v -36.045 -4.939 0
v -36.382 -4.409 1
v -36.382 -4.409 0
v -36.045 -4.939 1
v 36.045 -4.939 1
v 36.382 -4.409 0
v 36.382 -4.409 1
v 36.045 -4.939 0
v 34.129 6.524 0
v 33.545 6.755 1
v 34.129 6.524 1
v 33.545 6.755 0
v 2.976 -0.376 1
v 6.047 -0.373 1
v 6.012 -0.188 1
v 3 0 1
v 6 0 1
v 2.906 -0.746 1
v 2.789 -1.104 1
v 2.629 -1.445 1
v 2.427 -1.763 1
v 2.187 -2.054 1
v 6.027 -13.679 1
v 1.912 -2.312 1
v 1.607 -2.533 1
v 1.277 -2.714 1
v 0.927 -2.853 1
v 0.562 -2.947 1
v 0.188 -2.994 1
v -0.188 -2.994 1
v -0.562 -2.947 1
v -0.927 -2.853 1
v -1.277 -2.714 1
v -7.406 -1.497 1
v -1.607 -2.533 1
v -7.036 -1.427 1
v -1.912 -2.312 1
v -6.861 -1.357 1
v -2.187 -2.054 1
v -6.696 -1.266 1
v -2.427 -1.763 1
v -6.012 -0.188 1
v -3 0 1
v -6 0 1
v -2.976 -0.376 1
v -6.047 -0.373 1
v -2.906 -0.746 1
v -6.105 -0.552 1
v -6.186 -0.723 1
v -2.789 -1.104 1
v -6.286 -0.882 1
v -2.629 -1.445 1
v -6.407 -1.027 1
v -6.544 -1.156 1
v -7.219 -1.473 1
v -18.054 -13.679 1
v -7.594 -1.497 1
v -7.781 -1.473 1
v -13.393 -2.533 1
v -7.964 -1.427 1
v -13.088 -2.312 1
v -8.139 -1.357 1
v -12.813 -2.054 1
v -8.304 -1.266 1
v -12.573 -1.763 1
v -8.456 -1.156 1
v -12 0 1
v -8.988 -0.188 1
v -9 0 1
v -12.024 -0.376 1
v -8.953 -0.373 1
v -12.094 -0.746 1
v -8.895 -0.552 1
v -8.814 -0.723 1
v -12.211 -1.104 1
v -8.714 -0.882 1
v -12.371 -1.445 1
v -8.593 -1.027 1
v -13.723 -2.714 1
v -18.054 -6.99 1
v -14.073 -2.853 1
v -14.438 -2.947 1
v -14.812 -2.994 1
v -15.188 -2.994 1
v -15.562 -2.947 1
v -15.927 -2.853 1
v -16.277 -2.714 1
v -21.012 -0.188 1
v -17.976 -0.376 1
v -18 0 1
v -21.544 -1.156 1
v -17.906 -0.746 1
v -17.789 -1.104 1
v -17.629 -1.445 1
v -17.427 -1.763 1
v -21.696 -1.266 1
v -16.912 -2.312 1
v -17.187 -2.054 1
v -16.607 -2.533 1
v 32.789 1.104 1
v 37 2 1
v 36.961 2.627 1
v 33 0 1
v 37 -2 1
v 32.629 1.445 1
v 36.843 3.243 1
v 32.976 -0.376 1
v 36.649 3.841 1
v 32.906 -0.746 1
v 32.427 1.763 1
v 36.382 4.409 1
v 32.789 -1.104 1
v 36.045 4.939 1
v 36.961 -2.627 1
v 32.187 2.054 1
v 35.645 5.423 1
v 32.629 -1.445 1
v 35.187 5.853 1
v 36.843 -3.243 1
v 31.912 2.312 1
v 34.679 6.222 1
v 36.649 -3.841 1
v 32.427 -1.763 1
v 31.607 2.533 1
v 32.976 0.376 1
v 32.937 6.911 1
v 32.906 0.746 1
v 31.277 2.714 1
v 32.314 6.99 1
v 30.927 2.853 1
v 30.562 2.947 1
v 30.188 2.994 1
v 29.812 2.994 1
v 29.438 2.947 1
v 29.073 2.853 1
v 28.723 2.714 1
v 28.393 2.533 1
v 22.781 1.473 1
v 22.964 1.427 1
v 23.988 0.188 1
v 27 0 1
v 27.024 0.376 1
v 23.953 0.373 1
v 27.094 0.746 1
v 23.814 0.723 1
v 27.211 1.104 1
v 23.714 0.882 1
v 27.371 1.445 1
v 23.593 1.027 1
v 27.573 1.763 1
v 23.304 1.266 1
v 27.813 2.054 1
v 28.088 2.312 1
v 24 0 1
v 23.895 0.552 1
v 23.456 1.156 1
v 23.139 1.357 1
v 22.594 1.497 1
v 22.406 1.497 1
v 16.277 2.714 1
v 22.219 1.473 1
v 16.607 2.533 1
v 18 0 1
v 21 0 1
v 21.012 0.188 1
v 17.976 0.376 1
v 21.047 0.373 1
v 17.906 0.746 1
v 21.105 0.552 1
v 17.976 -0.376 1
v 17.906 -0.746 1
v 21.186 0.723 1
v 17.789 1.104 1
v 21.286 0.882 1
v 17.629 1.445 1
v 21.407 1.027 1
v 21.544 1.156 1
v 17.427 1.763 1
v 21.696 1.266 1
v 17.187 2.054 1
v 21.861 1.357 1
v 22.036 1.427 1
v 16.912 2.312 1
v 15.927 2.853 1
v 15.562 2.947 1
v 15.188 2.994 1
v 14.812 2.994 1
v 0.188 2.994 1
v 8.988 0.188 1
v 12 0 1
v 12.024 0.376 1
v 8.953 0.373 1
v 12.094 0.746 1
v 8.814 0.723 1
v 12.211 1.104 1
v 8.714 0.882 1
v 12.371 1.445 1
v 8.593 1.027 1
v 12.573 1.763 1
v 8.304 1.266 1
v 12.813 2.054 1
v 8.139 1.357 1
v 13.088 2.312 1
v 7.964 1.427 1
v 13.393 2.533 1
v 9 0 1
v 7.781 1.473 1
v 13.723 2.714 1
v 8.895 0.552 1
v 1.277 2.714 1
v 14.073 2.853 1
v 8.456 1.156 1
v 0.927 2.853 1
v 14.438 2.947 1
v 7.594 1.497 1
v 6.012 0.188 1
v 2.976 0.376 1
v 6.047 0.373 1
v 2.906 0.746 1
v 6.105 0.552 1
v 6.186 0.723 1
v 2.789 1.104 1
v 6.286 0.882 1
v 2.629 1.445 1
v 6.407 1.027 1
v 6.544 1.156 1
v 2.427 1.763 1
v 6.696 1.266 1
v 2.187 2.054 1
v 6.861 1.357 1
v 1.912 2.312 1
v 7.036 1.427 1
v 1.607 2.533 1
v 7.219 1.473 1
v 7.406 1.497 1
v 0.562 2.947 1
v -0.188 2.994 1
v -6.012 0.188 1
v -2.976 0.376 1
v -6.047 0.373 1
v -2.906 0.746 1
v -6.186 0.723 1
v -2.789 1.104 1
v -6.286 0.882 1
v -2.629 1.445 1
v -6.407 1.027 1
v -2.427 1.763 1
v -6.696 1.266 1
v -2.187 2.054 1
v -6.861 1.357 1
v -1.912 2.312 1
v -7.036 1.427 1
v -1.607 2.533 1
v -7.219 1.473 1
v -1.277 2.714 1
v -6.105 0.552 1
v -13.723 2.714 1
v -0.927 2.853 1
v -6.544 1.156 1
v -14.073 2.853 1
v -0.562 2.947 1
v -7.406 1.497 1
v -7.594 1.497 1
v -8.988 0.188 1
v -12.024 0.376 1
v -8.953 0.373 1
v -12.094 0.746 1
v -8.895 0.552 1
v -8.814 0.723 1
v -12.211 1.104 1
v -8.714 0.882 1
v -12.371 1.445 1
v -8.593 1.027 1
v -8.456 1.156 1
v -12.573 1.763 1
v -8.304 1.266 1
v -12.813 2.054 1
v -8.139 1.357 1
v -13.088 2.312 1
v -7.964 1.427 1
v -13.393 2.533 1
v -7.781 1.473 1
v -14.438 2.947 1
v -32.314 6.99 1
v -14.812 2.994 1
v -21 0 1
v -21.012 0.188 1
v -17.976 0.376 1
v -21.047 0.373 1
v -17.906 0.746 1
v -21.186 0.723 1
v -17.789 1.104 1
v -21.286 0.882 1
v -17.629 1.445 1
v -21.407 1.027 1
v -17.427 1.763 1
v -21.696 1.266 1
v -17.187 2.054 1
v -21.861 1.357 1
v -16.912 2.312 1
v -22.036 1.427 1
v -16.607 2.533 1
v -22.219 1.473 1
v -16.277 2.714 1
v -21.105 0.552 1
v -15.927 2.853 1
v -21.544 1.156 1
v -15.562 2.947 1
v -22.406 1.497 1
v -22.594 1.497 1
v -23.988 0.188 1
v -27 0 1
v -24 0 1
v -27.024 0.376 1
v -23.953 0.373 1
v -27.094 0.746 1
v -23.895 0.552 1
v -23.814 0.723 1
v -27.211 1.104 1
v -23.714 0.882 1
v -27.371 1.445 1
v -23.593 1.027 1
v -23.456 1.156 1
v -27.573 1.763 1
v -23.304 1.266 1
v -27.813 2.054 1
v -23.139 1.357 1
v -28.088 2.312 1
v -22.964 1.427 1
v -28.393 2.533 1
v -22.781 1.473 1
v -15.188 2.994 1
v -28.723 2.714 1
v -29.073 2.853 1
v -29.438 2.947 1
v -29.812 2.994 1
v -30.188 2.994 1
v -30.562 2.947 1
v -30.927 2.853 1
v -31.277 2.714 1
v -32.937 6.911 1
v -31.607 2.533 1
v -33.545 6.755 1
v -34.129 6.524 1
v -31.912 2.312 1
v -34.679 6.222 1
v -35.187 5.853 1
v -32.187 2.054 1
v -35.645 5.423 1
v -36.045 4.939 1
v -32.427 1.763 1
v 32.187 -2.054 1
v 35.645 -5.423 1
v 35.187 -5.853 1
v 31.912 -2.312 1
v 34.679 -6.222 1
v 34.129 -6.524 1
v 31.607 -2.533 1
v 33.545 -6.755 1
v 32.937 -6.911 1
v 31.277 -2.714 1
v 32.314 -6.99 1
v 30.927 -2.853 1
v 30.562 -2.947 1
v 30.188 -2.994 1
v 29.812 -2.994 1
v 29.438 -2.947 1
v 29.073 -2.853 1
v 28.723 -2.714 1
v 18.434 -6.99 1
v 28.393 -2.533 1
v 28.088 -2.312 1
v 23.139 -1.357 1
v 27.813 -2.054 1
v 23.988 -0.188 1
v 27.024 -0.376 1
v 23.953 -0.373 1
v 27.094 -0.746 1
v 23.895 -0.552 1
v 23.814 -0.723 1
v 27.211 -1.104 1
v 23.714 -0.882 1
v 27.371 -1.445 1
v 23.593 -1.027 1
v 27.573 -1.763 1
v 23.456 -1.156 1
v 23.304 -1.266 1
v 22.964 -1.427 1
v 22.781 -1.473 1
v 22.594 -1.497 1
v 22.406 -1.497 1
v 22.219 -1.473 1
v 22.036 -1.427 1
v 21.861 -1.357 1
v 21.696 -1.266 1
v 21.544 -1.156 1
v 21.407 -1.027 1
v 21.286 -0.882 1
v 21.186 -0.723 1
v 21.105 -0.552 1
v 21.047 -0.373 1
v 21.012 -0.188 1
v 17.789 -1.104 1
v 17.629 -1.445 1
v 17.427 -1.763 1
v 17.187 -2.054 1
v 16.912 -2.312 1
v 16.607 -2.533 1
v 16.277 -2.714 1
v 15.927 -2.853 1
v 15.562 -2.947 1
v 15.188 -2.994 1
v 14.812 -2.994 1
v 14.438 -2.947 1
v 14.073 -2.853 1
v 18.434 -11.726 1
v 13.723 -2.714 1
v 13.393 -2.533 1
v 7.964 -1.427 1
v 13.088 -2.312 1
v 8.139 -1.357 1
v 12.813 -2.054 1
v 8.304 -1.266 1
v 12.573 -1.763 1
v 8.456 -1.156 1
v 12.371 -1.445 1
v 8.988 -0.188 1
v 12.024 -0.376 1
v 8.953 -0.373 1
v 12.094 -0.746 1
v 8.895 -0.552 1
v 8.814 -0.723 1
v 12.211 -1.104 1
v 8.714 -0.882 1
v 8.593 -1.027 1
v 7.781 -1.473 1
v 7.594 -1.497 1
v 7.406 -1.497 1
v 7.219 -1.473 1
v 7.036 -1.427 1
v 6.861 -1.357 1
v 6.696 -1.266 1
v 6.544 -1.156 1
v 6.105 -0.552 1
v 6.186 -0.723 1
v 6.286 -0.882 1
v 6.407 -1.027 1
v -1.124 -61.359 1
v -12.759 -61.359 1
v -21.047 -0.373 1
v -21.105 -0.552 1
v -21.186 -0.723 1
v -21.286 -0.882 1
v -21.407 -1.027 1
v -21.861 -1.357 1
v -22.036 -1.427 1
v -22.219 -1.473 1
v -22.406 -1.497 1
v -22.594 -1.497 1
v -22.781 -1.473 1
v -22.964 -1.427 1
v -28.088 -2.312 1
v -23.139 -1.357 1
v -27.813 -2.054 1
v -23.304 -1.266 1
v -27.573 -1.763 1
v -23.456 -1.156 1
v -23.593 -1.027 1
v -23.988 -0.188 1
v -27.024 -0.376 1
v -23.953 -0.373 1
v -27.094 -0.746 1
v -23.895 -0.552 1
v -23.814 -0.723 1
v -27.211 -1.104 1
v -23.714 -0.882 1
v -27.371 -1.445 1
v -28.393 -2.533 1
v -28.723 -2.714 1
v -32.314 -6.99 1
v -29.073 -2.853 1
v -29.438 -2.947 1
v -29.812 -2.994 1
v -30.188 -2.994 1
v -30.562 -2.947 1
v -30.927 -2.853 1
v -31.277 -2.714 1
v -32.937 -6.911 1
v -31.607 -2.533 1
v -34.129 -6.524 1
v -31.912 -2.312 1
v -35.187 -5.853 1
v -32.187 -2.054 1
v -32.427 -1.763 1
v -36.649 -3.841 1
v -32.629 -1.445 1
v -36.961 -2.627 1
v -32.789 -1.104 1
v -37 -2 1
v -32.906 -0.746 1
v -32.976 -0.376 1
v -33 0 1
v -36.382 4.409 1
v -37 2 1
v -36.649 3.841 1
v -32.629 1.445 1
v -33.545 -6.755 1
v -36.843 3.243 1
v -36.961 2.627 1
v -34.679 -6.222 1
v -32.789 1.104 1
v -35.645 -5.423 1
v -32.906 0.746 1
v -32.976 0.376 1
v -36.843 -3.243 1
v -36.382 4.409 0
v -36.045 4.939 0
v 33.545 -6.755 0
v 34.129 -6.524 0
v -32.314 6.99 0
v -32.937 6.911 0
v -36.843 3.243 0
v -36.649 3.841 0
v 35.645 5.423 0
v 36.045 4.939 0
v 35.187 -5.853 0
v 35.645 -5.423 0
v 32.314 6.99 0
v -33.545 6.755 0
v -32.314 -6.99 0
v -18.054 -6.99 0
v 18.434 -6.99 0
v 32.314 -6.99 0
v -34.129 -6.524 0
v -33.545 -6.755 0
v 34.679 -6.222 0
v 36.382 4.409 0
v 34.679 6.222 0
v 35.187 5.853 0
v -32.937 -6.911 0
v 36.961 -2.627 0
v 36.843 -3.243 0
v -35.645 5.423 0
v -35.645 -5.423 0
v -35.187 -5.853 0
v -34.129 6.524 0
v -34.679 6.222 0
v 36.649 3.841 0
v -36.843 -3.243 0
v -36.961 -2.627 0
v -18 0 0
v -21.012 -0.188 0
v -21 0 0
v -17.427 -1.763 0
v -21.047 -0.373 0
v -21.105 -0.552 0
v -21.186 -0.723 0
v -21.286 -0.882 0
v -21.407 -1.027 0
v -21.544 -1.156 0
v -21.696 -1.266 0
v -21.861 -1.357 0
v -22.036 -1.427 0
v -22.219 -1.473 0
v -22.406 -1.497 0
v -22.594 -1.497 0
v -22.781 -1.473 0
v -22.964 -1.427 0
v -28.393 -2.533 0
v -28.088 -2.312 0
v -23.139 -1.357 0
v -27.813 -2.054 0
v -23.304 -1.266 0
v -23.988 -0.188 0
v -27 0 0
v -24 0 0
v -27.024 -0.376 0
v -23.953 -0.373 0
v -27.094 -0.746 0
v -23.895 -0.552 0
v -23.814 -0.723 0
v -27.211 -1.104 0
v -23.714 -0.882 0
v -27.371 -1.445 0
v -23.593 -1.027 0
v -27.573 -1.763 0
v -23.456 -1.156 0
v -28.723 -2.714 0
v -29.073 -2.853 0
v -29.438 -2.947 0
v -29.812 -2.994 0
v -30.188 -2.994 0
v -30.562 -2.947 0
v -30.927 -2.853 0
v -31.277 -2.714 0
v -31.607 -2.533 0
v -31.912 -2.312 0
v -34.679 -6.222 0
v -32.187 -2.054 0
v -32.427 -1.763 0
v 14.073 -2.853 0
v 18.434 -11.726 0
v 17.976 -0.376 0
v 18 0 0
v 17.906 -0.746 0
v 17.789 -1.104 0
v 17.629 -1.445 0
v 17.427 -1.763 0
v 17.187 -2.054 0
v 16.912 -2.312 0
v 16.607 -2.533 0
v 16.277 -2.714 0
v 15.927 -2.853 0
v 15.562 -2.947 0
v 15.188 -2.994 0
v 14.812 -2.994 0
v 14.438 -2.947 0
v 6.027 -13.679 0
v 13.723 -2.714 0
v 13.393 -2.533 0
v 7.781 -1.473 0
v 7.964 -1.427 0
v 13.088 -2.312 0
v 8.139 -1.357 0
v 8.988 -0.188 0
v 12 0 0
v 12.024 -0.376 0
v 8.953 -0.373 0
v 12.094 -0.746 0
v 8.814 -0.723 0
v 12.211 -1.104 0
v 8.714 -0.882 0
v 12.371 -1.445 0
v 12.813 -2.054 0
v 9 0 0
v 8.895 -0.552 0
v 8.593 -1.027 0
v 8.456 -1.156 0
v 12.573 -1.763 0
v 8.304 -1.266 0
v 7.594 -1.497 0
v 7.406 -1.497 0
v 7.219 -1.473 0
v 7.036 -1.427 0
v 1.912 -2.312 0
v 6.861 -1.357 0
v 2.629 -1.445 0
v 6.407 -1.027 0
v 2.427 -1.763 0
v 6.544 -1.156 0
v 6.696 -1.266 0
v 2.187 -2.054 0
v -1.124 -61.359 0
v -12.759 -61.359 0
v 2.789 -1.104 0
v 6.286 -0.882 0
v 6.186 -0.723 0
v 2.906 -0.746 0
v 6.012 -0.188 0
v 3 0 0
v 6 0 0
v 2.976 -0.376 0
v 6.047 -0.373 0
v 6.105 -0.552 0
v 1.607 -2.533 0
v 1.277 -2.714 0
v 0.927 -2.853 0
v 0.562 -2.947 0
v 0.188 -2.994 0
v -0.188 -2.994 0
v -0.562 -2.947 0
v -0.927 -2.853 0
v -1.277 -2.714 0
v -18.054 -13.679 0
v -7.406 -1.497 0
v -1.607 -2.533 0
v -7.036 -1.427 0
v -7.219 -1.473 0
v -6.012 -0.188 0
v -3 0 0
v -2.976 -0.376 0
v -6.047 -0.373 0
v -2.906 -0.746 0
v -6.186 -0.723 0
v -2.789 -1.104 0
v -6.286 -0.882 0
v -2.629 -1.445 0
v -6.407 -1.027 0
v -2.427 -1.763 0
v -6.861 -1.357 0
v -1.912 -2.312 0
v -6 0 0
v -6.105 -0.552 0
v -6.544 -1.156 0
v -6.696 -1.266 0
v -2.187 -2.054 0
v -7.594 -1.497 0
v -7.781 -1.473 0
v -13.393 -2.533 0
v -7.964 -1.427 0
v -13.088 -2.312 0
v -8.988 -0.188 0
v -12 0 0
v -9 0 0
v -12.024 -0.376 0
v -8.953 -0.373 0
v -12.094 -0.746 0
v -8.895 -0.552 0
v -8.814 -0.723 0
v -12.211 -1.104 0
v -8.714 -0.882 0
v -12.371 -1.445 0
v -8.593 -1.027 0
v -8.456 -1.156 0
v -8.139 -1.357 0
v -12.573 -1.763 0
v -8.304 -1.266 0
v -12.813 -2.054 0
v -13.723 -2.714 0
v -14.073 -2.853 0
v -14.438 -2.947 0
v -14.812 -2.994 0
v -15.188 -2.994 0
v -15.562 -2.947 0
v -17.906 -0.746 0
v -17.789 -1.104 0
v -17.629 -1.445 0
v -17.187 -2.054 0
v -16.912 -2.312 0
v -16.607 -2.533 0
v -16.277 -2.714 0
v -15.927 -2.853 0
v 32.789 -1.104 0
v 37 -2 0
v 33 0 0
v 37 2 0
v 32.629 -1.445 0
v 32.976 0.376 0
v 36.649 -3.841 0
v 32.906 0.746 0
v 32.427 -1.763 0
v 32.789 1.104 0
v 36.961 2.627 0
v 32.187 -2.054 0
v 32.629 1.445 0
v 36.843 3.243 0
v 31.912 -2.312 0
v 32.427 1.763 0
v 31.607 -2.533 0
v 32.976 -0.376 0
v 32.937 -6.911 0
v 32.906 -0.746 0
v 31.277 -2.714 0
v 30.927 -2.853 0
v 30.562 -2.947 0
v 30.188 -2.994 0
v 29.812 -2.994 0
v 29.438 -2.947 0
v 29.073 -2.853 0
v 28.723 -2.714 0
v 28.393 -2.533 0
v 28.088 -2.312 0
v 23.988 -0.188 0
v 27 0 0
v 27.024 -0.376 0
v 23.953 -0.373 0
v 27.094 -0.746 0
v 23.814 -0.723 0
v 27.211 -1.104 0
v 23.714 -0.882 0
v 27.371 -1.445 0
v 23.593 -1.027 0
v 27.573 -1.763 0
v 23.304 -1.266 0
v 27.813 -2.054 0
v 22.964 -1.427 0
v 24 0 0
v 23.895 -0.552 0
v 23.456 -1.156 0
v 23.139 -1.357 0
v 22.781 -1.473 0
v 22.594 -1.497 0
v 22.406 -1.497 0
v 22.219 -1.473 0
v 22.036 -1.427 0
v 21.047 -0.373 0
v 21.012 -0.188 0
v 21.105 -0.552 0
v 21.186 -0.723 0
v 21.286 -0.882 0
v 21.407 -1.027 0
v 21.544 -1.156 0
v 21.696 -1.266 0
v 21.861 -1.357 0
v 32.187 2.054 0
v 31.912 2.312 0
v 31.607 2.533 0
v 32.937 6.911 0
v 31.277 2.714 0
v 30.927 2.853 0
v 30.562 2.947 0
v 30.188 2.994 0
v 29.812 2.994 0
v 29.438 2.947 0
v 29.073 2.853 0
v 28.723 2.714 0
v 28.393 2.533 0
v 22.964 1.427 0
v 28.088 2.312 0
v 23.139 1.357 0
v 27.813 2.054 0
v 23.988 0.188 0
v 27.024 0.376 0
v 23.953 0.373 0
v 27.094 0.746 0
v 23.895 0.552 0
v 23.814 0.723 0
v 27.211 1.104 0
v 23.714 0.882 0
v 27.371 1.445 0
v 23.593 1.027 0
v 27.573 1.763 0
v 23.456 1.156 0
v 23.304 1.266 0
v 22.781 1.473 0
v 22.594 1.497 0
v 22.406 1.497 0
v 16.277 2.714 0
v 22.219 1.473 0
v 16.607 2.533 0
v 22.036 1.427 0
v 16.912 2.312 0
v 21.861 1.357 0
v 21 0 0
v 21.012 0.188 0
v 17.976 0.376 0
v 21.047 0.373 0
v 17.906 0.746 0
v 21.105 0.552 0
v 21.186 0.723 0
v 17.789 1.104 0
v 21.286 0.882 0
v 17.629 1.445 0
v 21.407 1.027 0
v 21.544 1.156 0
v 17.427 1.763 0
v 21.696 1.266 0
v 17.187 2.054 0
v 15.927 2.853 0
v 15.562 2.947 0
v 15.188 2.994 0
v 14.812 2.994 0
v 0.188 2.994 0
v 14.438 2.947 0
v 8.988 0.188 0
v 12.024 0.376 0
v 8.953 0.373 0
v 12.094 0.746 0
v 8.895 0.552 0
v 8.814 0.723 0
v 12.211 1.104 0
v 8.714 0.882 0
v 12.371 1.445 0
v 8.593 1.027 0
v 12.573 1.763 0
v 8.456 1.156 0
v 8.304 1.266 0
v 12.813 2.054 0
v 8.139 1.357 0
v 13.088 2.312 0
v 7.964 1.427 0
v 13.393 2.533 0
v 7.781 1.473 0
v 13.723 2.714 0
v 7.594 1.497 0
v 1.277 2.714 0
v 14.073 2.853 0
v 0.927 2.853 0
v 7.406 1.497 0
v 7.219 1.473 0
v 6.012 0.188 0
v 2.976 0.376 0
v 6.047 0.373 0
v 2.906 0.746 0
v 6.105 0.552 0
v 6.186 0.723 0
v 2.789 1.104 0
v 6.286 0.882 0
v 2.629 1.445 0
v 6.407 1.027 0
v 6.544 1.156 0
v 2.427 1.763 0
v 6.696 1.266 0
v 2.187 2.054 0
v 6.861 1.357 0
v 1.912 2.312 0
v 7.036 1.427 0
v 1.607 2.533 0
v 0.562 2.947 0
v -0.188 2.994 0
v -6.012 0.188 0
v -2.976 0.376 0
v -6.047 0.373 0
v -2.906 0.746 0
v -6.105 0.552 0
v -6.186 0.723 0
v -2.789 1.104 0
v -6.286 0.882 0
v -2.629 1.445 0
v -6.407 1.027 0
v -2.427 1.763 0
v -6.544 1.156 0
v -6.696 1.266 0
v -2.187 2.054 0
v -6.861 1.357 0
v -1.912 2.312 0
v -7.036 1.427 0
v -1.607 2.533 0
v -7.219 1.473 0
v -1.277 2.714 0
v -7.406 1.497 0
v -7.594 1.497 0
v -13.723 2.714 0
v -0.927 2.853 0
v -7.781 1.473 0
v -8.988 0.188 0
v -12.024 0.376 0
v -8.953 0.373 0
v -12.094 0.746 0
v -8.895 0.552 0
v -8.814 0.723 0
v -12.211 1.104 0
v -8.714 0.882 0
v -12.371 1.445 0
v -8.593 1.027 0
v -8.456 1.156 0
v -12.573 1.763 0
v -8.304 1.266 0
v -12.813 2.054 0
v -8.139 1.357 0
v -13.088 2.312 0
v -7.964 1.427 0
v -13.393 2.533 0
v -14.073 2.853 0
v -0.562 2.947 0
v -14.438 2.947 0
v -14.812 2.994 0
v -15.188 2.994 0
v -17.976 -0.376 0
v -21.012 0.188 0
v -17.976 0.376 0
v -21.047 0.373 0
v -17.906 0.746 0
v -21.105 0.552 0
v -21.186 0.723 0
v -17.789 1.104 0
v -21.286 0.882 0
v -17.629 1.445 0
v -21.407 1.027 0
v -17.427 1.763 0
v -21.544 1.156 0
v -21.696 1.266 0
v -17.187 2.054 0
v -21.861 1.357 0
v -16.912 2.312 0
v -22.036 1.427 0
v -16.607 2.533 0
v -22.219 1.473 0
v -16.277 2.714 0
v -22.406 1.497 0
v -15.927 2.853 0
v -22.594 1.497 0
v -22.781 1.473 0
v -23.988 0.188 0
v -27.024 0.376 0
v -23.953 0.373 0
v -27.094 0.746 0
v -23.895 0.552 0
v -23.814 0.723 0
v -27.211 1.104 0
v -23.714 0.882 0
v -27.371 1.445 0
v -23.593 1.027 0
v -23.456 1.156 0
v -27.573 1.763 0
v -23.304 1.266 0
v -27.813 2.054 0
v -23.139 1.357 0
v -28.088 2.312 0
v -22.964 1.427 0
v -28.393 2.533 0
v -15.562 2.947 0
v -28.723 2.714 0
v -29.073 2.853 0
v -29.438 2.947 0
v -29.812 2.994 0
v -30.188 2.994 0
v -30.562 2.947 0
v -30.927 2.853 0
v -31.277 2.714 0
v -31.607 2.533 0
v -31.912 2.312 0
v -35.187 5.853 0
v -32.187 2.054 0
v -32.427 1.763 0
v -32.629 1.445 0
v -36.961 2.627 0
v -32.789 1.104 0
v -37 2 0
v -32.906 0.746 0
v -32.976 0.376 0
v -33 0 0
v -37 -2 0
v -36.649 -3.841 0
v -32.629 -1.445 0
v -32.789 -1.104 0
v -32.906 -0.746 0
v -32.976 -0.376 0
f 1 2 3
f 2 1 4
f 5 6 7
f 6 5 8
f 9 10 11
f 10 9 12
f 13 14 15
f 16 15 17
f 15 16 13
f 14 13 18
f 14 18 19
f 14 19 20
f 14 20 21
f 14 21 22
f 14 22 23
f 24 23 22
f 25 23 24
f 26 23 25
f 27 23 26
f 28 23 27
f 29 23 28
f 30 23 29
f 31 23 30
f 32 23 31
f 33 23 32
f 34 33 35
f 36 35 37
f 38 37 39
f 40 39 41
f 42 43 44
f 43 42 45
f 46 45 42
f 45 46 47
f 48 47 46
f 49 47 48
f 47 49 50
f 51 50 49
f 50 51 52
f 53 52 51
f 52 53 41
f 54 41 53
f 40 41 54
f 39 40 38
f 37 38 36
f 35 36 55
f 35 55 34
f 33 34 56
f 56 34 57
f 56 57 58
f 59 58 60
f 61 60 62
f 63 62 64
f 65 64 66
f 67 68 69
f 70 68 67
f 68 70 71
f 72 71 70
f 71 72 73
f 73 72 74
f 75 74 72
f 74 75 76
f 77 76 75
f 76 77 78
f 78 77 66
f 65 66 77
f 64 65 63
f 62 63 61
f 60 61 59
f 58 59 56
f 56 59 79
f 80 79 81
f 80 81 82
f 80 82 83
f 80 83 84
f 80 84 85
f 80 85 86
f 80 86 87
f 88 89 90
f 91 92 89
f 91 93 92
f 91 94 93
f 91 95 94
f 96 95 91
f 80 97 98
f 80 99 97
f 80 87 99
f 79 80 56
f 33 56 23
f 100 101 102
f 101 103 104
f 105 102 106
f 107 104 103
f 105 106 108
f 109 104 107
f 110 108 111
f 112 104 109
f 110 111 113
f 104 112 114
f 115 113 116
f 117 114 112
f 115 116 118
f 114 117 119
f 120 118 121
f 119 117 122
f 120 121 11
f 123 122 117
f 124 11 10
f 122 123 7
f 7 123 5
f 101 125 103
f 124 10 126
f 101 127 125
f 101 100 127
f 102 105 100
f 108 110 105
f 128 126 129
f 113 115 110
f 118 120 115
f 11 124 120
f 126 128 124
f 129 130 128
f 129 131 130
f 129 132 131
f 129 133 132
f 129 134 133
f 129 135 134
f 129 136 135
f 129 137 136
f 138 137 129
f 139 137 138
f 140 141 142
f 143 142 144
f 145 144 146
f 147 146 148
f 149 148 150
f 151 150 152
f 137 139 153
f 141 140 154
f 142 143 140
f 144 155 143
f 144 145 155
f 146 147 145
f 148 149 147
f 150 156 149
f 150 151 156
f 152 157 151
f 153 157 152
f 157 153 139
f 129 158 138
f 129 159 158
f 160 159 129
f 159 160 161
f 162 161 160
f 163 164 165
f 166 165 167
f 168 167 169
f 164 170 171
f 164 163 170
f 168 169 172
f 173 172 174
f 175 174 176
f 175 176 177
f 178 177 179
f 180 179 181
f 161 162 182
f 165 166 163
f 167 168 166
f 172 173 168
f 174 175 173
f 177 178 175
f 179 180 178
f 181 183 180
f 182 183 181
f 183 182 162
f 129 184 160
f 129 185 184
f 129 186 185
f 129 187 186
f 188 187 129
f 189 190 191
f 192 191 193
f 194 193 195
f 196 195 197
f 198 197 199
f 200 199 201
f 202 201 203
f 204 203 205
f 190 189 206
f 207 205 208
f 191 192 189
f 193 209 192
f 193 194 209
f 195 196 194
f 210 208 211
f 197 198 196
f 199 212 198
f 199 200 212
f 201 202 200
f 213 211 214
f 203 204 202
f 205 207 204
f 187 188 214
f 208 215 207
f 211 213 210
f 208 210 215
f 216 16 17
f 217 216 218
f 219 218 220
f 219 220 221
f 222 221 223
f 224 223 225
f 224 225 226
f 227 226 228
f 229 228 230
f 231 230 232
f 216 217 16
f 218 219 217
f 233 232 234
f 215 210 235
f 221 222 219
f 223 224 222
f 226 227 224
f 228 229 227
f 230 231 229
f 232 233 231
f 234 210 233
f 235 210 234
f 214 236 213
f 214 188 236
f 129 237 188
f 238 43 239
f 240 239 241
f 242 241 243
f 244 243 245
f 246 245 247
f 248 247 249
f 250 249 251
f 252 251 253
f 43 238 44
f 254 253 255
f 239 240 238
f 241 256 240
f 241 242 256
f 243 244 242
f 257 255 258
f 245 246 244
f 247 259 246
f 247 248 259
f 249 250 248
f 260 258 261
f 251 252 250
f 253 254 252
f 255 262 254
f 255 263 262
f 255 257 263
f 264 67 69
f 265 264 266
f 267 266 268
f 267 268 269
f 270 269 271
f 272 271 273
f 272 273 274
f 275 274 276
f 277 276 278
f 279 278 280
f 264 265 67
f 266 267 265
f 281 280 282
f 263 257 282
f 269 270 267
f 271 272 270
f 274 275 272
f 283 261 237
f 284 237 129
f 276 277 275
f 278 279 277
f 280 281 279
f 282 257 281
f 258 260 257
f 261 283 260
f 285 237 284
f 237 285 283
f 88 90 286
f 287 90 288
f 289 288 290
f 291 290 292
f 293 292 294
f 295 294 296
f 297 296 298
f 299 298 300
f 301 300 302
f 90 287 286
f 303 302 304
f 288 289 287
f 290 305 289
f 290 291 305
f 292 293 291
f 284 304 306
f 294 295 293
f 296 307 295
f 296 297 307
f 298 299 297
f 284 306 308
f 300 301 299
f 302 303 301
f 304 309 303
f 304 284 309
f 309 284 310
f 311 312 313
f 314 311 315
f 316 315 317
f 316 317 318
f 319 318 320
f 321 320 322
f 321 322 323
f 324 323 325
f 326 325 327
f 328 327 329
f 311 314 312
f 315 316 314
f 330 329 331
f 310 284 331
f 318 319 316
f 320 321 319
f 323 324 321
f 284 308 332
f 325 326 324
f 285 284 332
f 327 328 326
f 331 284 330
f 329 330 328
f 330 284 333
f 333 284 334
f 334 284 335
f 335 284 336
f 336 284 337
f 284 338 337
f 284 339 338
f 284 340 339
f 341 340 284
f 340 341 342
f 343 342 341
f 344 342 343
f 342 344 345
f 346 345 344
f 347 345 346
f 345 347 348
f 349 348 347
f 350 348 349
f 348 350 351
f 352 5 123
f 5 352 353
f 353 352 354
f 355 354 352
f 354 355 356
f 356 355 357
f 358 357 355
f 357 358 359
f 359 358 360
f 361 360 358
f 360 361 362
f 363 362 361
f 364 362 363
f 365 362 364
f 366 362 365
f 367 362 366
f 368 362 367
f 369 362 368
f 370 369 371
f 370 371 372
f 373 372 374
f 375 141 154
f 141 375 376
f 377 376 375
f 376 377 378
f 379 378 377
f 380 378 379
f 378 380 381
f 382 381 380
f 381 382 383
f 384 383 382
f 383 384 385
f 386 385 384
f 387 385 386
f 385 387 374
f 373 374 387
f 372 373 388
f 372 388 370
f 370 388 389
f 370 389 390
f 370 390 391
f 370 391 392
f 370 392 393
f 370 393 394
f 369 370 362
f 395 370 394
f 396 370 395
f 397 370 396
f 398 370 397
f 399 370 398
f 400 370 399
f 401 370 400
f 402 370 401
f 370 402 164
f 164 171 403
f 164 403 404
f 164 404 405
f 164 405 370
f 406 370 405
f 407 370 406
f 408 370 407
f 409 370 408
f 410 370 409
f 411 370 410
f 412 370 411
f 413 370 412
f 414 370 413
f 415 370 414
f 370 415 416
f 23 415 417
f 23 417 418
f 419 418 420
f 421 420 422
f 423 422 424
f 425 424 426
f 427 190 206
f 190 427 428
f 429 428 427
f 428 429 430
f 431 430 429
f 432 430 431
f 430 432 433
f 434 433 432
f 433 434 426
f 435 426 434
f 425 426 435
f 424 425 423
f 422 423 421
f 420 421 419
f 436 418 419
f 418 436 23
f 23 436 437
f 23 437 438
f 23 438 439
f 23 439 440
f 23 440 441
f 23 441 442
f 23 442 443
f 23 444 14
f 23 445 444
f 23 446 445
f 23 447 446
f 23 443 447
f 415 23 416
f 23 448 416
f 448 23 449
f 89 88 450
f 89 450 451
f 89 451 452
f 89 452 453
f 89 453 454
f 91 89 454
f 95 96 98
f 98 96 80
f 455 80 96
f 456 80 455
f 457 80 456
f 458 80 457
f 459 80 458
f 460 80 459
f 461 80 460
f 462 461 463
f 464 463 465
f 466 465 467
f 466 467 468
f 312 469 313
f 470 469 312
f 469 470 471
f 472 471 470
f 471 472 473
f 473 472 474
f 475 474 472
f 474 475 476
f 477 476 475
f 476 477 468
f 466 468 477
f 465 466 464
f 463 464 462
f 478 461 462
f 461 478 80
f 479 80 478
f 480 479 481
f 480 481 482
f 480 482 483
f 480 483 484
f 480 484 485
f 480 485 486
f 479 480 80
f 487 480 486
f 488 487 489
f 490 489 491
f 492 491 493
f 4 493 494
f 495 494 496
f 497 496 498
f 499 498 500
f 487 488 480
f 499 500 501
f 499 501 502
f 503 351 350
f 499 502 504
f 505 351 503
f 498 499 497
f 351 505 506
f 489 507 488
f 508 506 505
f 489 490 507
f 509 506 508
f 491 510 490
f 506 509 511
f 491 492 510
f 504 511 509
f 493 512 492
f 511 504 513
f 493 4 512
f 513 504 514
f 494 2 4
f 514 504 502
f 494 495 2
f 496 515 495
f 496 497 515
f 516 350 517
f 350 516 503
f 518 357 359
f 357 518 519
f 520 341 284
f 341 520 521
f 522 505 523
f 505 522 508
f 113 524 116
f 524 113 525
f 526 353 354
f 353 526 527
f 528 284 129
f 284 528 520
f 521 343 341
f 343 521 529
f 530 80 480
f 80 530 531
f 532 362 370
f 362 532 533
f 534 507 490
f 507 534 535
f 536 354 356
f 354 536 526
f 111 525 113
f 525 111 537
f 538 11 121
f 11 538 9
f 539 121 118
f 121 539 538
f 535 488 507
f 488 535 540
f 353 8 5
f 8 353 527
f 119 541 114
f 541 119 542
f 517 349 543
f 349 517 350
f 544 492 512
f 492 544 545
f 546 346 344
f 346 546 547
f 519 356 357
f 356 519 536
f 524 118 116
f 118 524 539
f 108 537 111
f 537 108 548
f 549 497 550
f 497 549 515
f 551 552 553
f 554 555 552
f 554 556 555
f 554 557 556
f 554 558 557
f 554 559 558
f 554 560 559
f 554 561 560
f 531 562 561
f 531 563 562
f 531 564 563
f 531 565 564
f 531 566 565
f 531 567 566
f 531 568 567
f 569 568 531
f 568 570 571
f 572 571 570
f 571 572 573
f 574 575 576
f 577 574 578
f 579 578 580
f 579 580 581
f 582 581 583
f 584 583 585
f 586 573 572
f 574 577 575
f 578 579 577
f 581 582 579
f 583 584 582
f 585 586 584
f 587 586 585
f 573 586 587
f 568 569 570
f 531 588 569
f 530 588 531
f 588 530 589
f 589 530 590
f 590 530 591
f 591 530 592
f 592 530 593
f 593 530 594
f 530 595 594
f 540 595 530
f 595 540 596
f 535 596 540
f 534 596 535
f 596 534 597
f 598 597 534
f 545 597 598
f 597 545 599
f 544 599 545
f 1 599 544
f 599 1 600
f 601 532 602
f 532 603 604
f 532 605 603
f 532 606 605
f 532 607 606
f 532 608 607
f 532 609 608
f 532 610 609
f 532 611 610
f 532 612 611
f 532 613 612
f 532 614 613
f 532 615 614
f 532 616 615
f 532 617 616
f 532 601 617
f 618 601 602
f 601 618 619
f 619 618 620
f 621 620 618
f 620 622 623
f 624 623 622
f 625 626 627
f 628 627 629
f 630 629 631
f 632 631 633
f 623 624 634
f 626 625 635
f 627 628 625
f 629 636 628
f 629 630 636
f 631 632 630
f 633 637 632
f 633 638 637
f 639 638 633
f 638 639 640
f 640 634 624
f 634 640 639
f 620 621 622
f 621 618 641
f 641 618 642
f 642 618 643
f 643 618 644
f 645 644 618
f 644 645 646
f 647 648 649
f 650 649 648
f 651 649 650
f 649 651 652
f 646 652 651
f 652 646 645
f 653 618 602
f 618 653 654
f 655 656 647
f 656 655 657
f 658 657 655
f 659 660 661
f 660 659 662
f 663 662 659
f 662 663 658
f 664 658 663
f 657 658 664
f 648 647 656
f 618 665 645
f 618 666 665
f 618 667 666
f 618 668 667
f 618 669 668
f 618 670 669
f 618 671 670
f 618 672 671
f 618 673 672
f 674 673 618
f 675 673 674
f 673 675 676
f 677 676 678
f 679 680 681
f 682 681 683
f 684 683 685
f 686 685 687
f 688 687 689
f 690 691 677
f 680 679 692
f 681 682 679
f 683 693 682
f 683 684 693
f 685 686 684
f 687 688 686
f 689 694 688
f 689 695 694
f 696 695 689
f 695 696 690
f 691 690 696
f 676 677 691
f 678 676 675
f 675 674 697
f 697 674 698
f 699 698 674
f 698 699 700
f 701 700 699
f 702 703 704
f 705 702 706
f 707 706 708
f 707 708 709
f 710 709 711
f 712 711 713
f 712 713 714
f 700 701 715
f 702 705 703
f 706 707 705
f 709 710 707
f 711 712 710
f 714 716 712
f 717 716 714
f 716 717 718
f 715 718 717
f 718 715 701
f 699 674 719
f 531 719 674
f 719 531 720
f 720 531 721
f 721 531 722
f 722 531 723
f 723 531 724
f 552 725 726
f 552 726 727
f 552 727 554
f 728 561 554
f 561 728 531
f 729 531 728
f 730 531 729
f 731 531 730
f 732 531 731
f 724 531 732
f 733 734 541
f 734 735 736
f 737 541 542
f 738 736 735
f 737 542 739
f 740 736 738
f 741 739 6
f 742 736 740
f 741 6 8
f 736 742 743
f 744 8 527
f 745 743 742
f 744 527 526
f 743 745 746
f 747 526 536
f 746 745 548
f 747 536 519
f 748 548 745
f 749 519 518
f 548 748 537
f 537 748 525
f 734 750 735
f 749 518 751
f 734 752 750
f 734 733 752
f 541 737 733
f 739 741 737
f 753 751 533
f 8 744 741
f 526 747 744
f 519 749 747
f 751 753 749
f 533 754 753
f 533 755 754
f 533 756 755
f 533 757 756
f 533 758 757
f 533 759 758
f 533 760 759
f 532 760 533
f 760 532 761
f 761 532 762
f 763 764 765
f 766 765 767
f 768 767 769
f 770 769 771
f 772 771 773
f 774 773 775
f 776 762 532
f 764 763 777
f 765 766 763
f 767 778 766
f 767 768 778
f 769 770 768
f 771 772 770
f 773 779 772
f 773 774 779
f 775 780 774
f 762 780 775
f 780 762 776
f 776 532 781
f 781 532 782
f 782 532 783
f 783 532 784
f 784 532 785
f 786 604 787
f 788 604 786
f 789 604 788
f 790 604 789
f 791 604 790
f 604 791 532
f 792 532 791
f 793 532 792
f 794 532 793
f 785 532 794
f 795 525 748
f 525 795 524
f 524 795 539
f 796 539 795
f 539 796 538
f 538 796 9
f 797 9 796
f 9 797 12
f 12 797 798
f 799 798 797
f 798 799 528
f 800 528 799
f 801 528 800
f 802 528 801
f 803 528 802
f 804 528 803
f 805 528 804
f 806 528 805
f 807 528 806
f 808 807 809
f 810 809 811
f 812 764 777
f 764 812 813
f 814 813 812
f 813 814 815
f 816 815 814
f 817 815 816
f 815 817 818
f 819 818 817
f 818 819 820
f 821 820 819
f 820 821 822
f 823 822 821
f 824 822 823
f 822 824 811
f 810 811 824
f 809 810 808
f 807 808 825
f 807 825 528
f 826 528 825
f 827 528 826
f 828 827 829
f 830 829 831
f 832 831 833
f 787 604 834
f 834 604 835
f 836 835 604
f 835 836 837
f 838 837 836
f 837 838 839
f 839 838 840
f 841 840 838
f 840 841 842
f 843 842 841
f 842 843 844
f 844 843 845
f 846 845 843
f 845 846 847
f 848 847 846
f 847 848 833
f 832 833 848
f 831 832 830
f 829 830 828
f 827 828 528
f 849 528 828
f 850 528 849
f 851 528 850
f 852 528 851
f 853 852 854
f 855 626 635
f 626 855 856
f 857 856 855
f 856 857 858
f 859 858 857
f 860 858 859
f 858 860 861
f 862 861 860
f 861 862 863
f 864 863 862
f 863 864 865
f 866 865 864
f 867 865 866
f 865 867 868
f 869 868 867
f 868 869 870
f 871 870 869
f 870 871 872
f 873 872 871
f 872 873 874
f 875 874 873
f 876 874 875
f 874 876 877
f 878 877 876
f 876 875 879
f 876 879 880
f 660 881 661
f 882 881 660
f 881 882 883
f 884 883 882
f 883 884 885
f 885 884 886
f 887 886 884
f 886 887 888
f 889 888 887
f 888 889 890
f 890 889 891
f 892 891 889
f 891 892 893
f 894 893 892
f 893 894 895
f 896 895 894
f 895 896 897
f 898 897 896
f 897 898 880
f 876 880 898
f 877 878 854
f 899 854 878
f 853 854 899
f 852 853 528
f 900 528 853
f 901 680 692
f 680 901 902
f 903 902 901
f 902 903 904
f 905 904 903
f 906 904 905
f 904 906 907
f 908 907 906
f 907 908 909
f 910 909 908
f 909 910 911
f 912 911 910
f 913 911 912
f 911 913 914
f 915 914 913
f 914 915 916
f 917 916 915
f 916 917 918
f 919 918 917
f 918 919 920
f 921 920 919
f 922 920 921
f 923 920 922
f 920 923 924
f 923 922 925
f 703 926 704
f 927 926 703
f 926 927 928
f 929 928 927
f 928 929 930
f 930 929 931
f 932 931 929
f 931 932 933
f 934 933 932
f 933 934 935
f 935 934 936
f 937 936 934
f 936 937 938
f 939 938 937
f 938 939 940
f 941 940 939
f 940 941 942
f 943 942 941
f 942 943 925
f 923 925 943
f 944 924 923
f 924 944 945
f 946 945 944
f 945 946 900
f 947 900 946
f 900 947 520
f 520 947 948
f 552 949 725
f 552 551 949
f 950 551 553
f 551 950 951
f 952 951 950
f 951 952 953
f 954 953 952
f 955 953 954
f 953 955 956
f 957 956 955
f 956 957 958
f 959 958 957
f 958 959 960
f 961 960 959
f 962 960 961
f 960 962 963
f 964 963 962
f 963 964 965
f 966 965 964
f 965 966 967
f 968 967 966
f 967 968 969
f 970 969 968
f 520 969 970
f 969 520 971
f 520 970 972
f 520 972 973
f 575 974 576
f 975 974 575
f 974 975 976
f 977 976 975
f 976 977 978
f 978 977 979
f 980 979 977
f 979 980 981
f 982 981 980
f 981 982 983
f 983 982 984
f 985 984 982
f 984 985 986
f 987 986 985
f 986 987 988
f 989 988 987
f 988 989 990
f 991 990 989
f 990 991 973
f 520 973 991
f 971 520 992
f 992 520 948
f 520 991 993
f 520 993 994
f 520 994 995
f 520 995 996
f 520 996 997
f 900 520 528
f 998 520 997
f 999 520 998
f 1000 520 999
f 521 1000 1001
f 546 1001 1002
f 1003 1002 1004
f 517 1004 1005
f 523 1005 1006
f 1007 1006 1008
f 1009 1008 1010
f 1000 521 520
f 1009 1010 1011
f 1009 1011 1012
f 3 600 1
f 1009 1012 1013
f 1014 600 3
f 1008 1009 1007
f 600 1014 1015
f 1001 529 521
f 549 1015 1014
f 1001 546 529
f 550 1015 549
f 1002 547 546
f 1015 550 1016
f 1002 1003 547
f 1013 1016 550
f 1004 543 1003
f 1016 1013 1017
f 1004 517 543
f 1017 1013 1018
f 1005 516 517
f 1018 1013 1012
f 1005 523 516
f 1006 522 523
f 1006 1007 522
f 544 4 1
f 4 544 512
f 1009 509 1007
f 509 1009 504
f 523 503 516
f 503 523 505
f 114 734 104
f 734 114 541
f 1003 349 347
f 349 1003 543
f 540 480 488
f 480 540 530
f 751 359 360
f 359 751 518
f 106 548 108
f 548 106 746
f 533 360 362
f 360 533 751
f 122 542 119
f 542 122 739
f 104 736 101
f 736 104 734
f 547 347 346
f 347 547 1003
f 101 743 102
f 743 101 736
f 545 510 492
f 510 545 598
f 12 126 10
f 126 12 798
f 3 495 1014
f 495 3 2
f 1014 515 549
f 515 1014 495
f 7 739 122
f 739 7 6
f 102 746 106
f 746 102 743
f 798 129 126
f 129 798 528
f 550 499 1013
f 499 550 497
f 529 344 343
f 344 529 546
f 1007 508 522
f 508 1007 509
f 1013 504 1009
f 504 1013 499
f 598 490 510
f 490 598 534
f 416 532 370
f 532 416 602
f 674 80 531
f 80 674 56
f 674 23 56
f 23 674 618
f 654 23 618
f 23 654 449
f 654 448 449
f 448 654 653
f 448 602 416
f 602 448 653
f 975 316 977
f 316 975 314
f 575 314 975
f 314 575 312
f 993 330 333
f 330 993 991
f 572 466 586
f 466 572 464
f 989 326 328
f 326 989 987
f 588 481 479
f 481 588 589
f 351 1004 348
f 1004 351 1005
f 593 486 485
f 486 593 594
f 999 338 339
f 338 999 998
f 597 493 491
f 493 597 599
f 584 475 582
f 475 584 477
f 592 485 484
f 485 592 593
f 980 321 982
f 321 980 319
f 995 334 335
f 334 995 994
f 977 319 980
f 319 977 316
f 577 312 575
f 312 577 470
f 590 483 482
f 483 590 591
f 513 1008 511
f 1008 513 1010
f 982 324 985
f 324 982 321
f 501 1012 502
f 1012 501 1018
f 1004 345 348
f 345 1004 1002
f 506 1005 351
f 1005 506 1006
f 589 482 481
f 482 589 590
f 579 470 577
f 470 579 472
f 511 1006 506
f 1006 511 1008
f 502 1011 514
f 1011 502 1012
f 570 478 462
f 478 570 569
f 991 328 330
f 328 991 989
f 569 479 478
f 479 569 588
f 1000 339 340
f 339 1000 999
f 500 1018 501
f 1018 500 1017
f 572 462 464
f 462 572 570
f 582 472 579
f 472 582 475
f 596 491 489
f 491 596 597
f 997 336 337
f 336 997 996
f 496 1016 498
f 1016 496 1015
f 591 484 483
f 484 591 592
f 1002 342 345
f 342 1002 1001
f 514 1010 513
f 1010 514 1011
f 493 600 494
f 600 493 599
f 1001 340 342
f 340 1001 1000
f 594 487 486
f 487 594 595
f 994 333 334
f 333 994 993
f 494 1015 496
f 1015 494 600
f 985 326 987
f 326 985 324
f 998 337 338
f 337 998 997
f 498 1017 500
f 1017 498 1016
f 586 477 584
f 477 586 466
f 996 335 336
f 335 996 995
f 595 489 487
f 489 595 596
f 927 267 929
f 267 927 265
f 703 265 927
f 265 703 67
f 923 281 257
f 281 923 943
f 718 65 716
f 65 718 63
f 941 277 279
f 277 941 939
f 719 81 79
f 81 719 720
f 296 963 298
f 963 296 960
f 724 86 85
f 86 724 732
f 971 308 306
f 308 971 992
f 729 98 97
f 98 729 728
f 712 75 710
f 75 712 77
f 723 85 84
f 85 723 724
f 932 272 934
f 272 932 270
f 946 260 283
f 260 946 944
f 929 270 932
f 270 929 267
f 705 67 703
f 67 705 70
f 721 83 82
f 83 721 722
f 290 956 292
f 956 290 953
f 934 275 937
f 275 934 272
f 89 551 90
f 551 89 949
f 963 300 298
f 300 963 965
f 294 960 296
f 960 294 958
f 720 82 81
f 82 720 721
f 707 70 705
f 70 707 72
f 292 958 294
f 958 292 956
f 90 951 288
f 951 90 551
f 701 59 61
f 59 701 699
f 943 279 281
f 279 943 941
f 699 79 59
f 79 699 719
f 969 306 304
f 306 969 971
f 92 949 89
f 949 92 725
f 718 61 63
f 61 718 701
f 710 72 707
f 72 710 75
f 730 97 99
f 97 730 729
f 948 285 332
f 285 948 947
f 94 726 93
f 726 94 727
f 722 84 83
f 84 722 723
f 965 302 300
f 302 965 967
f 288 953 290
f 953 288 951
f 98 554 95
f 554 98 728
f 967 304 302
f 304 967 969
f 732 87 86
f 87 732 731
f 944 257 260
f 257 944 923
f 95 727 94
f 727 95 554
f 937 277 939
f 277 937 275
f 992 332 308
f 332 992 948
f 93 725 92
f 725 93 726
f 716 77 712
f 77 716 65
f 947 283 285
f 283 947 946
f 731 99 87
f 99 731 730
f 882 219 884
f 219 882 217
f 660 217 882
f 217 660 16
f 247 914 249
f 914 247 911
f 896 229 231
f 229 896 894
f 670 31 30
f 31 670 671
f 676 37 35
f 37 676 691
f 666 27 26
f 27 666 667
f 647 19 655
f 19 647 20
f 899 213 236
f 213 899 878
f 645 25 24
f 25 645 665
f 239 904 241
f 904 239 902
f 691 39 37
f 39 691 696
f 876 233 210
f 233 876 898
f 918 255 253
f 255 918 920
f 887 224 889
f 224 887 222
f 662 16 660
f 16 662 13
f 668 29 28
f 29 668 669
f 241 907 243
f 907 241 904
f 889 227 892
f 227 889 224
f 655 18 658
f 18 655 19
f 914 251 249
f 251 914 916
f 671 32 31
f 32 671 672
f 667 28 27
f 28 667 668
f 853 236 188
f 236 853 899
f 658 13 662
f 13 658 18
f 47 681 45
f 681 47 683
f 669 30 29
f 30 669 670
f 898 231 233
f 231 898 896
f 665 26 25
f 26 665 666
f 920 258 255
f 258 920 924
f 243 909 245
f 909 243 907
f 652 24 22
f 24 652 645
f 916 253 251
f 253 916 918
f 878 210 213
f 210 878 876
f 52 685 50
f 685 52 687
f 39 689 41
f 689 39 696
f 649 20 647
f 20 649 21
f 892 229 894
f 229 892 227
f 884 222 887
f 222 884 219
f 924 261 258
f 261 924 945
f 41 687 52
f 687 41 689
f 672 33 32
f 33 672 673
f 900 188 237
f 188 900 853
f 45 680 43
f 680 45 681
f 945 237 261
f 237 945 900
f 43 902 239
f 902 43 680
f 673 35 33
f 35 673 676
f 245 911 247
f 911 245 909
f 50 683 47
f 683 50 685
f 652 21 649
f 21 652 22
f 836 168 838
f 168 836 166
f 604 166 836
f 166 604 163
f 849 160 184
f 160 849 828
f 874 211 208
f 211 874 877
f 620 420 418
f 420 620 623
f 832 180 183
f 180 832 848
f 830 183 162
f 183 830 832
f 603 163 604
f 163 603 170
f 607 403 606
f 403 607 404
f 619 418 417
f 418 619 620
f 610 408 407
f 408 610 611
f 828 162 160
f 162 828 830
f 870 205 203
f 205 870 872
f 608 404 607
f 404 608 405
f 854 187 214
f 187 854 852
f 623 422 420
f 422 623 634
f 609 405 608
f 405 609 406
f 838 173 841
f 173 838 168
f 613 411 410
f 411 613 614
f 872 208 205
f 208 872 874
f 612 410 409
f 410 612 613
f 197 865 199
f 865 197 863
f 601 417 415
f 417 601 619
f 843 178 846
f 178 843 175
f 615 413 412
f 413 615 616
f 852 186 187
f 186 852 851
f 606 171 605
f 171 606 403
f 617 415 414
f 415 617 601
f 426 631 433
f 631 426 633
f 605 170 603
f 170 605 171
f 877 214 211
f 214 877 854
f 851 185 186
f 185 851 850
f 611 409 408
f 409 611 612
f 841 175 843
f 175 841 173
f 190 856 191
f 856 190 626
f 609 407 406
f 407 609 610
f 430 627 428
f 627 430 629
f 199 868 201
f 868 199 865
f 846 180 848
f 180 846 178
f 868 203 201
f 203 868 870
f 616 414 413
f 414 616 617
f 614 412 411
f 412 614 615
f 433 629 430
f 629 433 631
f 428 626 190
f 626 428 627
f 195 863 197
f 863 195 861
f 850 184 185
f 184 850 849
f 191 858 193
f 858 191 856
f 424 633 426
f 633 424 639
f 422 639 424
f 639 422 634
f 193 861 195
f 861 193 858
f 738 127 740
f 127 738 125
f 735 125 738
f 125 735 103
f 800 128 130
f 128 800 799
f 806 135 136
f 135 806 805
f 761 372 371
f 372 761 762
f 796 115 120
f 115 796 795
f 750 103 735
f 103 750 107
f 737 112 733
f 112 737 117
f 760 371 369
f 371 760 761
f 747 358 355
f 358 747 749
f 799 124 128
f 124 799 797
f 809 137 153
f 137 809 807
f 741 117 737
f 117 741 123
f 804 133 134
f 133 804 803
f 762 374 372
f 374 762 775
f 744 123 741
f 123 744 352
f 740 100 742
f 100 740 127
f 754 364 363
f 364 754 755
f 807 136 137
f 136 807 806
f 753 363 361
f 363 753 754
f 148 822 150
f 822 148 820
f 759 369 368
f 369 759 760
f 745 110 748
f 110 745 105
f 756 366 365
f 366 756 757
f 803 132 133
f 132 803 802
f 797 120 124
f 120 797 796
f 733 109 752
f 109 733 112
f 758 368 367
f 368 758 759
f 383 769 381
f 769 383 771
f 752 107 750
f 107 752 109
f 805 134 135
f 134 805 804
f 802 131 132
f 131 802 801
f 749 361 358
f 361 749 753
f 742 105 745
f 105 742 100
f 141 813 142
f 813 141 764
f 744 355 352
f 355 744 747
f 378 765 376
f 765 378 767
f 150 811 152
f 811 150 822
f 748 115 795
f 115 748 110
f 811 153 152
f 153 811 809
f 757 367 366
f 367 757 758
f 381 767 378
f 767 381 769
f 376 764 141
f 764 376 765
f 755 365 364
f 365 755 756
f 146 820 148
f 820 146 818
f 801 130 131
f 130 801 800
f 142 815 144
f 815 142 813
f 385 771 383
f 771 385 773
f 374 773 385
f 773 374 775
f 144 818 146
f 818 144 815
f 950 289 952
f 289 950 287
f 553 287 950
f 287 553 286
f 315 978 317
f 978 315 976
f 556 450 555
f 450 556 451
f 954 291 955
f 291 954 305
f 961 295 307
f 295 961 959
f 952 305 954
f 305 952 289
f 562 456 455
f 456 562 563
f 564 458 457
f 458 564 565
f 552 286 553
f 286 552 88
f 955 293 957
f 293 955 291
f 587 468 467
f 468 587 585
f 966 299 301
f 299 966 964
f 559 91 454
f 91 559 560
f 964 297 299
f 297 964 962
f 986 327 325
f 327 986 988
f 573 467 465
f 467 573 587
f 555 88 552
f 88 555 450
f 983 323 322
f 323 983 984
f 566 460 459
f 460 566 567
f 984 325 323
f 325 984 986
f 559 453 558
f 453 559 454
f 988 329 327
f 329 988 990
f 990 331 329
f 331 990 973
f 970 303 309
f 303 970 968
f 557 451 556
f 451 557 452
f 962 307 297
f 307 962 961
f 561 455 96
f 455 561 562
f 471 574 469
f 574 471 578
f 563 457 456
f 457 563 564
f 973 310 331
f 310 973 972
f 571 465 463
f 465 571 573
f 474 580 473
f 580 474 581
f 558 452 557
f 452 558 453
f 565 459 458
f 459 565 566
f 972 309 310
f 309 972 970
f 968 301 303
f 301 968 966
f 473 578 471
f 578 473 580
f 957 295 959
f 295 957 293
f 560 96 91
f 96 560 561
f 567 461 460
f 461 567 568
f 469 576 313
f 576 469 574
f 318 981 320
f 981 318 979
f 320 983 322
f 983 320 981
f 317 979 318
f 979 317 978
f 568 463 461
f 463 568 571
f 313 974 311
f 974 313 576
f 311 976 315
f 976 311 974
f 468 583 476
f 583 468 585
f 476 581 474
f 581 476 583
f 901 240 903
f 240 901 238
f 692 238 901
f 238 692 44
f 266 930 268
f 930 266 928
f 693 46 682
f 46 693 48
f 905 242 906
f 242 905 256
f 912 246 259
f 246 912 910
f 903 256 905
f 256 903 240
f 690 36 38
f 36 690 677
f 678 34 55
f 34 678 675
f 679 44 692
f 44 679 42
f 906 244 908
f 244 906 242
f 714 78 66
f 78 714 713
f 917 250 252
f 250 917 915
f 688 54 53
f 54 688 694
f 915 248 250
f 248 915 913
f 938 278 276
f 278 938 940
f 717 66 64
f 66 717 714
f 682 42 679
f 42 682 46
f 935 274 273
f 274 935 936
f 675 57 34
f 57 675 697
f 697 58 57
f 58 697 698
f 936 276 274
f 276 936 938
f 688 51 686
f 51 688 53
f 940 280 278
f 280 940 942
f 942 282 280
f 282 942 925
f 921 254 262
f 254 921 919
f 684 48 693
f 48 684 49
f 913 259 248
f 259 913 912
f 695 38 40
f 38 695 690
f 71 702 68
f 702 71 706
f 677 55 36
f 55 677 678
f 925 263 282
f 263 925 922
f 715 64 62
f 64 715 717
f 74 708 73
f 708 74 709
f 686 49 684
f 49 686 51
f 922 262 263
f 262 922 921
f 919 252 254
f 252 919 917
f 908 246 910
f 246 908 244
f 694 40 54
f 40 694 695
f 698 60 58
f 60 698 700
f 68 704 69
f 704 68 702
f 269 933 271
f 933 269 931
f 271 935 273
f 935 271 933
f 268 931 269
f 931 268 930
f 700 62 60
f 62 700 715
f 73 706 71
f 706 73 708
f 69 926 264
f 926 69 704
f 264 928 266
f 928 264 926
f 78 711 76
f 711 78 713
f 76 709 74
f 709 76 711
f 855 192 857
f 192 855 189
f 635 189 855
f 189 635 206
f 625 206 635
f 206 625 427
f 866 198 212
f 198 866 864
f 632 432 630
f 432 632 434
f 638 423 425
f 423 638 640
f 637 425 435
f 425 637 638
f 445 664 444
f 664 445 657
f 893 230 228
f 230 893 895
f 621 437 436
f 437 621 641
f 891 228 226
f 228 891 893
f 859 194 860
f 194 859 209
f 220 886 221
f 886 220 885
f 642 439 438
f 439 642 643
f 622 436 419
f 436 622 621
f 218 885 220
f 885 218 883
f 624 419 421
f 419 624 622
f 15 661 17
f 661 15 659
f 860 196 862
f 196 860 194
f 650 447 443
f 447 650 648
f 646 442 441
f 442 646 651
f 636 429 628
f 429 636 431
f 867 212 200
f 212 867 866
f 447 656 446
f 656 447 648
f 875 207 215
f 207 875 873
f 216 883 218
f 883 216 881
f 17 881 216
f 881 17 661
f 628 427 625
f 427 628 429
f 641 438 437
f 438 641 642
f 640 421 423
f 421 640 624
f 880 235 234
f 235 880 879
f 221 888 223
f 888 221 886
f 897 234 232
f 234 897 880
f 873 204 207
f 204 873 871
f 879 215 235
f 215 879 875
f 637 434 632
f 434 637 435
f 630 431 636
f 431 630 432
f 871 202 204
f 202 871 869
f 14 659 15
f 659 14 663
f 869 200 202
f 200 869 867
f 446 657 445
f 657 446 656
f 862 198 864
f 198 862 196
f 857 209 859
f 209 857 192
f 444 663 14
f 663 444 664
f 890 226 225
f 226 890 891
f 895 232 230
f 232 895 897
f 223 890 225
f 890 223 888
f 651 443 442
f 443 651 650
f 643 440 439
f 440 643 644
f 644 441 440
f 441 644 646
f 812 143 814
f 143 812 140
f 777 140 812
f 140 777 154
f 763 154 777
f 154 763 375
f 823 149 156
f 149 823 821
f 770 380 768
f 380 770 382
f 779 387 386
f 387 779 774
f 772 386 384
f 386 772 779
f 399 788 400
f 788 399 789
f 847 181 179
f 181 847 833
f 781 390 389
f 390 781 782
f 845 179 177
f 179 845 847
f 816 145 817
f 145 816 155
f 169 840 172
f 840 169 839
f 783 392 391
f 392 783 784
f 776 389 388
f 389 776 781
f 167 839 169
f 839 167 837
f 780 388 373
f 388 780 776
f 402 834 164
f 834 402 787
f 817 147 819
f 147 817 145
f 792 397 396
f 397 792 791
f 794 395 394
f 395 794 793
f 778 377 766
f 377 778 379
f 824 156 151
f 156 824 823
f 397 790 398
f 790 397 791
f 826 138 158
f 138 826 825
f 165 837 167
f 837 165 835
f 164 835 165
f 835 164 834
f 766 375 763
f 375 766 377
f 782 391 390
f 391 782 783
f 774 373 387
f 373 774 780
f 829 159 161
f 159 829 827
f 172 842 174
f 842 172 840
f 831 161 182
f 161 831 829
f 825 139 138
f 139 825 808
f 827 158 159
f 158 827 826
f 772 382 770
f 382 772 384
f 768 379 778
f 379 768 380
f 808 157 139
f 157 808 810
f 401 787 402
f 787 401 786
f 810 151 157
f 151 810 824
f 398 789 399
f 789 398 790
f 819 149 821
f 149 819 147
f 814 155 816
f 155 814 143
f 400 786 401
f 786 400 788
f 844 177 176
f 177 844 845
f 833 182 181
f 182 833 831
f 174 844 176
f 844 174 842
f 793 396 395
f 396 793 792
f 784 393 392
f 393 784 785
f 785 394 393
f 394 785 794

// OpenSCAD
$fn = 50;


difference() {
	union() {
		*color(alpha = 1.0000000000, c = "gray") {
			translate(v = [0, 14, 0]) {
				linear_extrude(height = 1) {
					text(font = "Arial:style=Bold", halign = "center", size = 4.5000000000, text = "COMMENT description oobb_plate_shape_p_type_1_depth_5_width_1_thickness_7_extra_oobb_size", valign = "center");
				}
			}
		}
		hull() {
			translate(v = [-32.0000000000, 2.0000000000, 0]) {
				cylinder(h = 1, r = 5);
			}
			translate(v = [32.0000000000, 2.0000000000, 0]) {
				cylinder(h = 1, r = 5);
			}
			translate(v = [-32.0000000000, -2.0000000000, 0]) {
				cylinder(h = 1, r = 5);
			}
			translate(v = [32.0000000000, -2.0000000000, 0]) {
				cylinder(h = 1, r = 5);
			}
		}
		translate(v = [0, -5, 0]) {
			linear_extrude(height = 1) {
				text(font = "DejaVu Sans Mono:style=Bold", halign = "center", size = 57.0000000000, text = "7", valign = "top");
			}
		}
	}
	union() {
		*color(alpha = 1.0000000000, c = "gray") {
			translate(v = [0, 14, 0]) {
				linear_extrude(height = 1) {
					text(font = "Arial:style=Bold", halign = "center", size = 4.5000000000, text = "COMMENT description oobb_holes_shape_n_type_5_width_1_thickness_7_extra_oobb_size_1_height_'all'_holes_true_both_holes", valign = "center");
				}
			}
		}
		translate(v = [-30.0000000000, 0.0000000000, 0]) {
			translate(v = [0, 0, -50]) {
				cylinder(h = 100, r = 3.0000000000);
			}
		}
		translate(v = [-15.0000000000, 0.0000000000, 0]) {
			translate(v = [0, 0, -50]) {
				cylinder(h = 100, r = 3.0000000000);
			}
		}
		translate(v = [0, 0, -50]) {
			cylinder(h = 100, r = 3.0000000000);
		}
		translate(v = [15.0000000000, 0.0000000000, 0]) {
			translate(v = [0, 0, -50]) {
				cylinder(h = 100, r = 3.0000000000);
			}
		}
		translate(v = [30.0000000000, 0.0000000000, 0]) {
			translate(v = [0, 0, -50]) {
				cylinder(h = 100, r = 3.0000000000);
			}
		}
		translate(v = [-30.0000000000, 0.0000000000, 0]) {
			translate(v = [0, 0, -50]) {
				cylinder(h = 100, r = 1.5000000000);
			}
		}
		translate(v = [-22.5000000000, 0.0000000000, 0]) {
			translate(v = [0, 0, -50]) {
				cylinder(h = 100, r = 1.5000000000);
			}
		}
		translate(v = [-15.0000000000, 0.0000000000, 0]) {
			translate(v = [0, 0, -50]) {
				cylinder(h = 100, r = 1.5000000000);
			}
		}
		translate(v = [-7.5000000000, 0.0000000000, 0]) {
			translate(v = [0, 0, -50]) {
				cylinder(h = 100, r = 1.5000000000);
			}
		}
		translate(v = [0, 0, -50]) {
			cylinder(h = 100, r = 1.5000000000);
		}
		translate(v = [7.5000000000, 0.0000000000, 0]) {
			translate(v = [0, 0, -50]) {
				cylinder(h = 100, r = 1.5000000000);
			}
		}
		translate(v = [15.0000000000, 0.0000000000, 0]) {
			translate(v = [0, 0, -50]) {
				cylinder(h = 100, r = 1.5000000000);
			}
		}
		translate(v = [22.5000000000, 0.0000000000, 0]) {
			translate(v = [0, 0, -50]) {
				cylinder(h = 100, r = 1.5000000000);
			}
		}
		translate(v = [30.0000000000, 0.0000000000, 0]) {
			translate(v = [0, 0, -50]) {
				cylinder(h = 100, r = 1.5000000000);
			}
		}
	}
}
